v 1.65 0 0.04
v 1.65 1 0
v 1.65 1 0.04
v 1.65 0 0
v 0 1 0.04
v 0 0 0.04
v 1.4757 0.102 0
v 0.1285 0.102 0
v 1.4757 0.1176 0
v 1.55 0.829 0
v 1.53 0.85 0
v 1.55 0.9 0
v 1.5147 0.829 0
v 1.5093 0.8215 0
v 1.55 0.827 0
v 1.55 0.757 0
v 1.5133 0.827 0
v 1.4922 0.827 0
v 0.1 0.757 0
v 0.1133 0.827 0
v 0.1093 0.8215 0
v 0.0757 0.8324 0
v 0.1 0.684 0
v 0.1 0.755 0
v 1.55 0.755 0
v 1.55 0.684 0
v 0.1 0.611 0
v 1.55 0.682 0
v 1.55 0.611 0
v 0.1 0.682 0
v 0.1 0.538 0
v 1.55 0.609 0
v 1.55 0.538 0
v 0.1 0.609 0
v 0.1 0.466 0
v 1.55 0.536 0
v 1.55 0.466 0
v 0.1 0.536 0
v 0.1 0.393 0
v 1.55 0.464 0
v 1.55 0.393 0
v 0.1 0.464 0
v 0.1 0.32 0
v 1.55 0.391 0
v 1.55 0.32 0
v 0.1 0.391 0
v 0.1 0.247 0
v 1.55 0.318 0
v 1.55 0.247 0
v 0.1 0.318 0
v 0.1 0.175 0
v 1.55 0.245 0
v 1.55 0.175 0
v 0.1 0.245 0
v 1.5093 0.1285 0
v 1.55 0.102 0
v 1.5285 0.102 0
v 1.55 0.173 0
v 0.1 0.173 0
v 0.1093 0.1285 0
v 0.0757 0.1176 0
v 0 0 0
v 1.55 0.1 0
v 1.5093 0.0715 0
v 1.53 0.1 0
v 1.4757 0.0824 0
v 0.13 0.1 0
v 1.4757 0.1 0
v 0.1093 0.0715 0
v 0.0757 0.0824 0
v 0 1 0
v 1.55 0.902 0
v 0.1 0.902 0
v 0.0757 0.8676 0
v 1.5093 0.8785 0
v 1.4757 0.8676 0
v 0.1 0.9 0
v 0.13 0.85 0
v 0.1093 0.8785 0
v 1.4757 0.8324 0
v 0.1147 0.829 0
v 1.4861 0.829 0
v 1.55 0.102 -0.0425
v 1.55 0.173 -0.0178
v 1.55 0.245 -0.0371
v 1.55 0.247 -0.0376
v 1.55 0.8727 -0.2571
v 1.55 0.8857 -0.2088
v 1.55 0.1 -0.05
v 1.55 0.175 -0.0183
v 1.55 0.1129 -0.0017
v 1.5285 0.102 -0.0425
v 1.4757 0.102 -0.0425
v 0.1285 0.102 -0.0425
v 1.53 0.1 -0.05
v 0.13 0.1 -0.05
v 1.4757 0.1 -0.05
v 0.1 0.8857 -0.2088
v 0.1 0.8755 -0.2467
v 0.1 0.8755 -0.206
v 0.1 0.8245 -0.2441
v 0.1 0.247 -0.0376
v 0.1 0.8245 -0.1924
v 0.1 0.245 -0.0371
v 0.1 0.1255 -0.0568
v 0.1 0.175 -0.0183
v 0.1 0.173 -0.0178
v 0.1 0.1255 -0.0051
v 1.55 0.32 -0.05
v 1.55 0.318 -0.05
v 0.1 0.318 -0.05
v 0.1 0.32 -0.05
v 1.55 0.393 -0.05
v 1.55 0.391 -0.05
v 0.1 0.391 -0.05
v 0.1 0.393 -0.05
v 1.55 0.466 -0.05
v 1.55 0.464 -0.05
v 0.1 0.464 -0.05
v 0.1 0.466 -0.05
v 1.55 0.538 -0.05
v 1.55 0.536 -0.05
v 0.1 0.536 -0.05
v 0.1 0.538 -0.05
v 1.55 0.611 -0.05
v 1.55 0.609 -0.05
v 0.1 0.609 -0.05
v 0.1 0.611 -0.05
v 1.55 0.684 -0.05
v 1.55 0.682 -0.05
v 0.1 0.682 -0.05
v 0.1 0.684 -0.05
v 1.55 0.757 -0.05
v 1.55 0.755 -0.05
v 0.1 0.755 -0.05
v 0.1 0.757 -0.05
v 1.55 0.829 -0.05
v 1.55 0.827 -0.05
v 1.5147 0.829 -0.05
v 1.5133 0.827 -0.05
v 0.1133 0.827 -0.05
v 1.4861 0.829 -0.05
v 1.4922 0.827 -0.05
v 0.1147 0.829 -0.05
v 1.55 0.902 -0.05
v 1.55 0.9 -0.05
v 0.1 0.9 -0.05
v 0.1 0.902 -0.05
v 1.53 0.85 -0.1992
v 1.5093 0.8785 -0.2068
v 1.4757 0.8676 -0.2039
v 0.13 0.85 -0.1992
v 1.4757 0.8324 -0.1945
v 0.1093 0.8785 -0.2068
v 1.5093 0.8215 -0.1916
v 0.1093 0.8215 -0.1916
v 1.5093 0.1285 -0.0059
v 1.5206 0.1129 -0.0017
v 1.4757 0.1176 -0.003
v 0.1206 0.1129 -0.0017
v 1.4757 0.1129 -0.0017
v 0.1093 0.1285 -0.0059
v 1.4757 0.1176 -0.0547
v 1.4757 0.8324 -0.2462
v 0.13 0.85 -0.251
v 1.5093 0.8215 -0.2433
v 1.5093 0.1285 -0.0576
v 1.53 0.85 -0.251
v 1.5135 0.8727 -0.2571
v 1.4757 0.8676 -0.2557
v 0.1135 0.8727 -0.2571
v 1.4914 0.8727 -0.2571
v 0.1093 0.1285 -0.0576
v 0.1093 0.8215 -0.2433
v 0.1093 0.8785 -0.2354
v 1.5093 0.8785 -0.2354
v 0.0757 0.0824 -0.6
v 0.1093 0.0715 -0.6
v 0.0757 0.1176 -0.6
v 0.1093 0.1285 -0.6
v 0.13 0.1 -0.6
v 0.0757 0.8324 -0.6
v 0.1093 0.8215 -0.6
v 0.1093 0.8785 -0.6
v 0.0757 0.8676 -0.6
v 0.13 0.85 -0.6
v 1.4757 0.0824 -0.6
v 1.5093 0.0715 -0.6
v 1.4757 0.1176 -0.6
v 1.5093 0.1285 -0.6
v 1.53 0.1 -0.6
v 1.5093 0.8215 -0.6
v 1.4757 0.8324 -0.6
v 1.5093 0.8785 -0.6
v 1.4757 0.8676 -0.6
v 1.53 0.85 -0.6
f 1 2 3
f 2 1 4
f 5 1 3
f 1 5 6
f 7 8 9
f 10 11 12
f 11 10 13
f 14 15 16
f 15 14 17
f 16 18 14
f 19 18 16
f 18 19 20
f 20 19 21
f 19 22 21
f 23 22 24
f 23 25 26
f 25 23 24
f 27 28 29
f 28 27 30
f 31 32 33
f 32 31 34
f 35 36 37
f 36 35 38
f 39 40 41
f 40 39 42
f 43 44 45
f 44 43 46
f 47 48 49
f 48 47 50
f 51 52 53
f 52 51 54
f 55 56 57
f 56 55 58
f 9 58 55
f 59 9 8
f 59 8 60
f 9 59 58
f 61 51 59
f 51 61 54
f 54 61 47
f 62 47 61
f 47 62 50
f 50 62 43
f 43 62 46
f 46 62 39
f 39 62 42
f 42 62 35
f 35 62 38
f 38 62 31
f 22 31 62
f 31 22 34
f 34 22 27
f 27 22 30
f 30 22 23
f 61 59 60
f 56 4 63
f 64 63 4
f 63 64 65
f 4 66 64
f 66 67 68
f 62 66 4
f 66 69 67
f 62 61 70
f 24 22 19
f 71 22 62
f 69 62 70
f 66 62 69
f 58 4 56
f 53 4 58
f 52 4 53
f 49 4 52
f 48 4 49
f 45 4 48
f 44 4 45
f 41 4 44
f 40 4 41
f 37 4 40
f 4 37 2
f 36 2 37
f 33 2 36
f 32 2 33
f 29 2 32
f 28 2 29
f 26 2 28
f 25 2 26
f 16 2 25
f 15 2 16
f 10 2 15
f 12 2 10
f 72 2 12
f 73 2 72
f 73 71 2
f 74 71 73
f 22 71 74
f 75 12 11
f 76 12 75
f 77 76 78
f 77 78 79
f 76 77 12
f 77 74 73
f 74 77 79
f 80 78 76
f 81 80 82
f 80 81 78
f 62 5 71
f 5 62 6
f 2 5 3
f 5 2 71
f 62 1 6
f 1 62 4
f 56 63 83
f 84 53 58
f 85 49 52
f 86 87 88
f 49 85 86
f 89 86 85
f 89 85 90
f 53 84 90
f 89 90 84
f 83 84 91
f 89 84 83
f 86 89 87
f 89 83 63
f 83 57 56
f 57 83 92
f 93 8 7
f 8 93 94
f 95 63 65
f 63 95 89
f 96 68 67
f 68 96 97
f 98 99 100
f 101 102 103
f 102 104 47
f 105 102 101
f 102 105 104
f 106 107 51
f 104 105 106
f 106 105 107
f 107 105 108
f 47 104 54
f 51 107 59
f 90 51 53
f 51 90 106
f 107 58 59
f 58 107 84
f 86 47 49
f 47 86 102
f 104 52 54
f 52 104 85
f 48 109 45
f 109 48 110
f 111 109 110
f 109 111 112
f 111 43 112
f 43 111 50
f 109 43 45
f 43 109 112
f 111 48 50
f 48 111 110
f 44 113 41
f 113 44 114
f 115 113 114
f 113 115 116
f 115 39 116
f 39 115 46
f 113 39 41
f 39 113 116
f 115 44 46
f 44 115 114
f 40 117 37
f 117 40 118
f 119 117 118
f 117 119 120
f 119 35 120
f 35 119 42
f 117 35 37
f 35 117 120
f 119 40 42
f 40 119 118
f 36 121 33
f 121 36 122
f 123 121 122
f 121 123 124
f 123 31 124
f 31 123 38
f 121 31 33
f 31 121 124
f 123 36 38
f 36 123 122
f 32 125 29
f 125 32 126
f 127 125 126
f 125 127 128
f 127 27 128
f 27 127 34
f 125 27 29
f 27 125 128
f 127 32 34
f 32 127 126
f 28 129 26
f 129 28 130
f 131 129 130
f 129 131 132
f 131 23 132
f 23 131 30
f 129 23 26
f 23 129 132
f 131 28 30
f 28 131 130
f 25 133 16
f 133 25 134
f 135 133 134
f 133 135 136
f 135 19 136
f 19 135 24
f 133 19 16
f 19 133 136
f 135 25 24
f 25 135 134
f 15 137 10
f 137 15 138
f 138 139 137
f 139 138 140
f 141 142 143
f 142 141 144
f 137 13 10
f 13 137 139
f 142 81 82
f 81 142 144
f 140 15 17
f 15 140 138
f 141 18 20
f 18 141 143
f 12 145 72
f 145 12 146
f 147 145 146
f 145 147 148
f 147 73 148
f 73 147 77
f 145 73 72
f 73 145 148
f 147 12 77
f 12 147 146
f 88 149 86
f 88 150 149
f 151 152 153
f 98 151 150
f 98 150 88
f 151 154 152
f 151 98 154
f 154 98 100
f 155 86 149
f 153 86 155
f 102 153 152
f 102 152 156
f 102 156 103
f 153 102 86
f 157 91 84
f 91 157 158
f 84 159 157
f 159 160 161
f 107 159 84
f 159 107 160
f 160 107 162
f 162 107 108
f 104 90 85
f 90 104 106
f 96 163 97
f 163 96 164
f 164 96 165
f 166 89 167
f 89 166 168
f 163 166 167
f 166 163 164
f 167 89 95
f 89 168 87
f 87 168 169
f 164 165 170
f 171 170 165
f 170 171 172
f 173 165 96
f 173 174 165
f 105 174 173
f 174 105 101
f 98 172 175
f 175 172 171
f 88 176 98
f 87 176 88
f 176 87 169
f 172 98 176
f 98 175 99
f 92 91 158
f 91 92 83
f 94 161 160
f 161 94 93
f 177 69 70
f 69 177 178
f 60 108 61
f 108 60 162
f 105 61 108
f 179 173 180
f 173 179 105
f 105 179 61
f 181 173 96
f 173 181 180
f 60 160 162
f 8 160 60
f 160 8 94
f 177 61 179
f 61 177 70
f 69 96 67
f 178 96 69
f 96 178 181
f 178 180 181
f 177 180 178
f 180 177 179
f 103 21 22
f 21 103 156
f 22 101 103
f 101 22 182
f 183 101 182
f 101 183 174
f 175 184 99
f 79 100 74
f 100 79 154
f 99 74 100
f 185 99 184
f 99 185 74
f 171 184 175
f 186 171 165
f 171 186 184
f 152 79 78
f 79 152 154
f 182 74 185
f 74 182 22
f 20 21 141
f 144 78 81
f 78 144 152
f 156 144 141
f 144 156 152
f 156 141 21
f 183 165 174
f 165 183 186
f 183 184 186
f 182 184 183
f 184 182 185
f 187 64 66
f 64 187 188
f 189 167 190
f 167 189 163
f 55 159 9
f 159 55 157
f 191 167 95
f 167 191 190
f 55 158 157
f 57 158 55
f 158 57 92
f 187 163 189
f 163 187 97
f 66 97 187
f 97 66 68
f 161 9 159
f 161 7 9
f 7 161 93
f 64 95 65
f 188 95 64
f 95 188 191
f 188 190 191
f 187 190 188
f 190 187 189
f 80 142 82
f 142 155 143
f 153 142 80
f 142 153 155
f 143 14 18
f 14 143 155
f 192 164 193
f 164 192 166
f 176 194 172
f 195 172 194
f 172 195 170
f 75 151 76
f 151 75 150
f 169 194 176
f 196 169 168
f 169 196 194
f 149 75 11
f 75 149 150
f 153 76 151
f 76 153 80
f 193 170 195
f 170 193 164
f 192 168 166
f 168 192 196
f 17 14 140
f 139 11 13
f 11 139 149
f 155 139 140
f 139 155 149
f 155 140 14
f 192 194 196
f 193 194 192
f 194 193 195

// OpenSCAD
// NEXORA - Plan 3D panneau solaire
// Ville : Ouagadougou
// Temperature cellule : 56.8 C
// Rendement : 17.5 %
// Inclinaison : 15 degres

// Panneau principal
color([0.1, 0.1, 0.3])
cube([1.65, 1.00, 0.040]);

// Ailettes de refroidissement sous le panneau
color([0.7, 0.7, 0.7])
translate([0.1, 0.100, -0.050])
cube([1.45, 0.002, 0.050]);
translate([0.1, 0.173, -0.050])
cube([1.45, 0.002, 0.050]);
translate([0.1, 0.245, -0.050])
cube([1.45, 0.002, 0.050]);
translate([0.1, 0.318, -0.050])
cube([1.45, 0.002, 0.050]);
translate([0.1, 0.391, -0.050])
cube([1.45, 0.002, 0.050]);
translate([0.1, 0.464, -0.050])
cube([1.45, 0.002, 0.050]);
translate([0.1, 0.536, -0.050])
cube([1.45, 0.002, 0.050]);
translate([0.1, 0.609, -0.050])
cube([1.45, 0.002, 0.050]);
translate([0.1, 0.682, -0.050])
cube([1.45, 0.002, 0.050]);
translate([0.1, 0.755, -0.050])
cube([1.45, 0.002, 0.050]);
translate([0.1, 0.827, -0.050])
cube([1.45, 0.002, 0.050]);
translate([0.1, 0.900, -0.050])
cube([1.45, 0.002, 0.050]);

// Support incline
color([0.4, 0.2, 0.1])
translate([0.1, 0.1, -0.050])
rotate([-15, 0, 0])
cube([1.45, 0.80, 0.05]);

// Pieds du support
color([0.3, 0.3, 0.3])
translate([0.10, 0.10, -0.6])
cylinder(h=0.6, r=0.03);
translate([0.10, 0.85, -0.6])
cylinder(h=0.6, r=0.03);
translate([1.50, 0.10, -0.6])
cylinder(h=0.6, r=0.03);
translate([1.50, 0.85, -0.6])
cylinder(h=0.6, r=0.03);

// ---
// Vue de dessus recommandee dans OpenSCAD
// Pour exporter en STL : File > Export > Export as STL
